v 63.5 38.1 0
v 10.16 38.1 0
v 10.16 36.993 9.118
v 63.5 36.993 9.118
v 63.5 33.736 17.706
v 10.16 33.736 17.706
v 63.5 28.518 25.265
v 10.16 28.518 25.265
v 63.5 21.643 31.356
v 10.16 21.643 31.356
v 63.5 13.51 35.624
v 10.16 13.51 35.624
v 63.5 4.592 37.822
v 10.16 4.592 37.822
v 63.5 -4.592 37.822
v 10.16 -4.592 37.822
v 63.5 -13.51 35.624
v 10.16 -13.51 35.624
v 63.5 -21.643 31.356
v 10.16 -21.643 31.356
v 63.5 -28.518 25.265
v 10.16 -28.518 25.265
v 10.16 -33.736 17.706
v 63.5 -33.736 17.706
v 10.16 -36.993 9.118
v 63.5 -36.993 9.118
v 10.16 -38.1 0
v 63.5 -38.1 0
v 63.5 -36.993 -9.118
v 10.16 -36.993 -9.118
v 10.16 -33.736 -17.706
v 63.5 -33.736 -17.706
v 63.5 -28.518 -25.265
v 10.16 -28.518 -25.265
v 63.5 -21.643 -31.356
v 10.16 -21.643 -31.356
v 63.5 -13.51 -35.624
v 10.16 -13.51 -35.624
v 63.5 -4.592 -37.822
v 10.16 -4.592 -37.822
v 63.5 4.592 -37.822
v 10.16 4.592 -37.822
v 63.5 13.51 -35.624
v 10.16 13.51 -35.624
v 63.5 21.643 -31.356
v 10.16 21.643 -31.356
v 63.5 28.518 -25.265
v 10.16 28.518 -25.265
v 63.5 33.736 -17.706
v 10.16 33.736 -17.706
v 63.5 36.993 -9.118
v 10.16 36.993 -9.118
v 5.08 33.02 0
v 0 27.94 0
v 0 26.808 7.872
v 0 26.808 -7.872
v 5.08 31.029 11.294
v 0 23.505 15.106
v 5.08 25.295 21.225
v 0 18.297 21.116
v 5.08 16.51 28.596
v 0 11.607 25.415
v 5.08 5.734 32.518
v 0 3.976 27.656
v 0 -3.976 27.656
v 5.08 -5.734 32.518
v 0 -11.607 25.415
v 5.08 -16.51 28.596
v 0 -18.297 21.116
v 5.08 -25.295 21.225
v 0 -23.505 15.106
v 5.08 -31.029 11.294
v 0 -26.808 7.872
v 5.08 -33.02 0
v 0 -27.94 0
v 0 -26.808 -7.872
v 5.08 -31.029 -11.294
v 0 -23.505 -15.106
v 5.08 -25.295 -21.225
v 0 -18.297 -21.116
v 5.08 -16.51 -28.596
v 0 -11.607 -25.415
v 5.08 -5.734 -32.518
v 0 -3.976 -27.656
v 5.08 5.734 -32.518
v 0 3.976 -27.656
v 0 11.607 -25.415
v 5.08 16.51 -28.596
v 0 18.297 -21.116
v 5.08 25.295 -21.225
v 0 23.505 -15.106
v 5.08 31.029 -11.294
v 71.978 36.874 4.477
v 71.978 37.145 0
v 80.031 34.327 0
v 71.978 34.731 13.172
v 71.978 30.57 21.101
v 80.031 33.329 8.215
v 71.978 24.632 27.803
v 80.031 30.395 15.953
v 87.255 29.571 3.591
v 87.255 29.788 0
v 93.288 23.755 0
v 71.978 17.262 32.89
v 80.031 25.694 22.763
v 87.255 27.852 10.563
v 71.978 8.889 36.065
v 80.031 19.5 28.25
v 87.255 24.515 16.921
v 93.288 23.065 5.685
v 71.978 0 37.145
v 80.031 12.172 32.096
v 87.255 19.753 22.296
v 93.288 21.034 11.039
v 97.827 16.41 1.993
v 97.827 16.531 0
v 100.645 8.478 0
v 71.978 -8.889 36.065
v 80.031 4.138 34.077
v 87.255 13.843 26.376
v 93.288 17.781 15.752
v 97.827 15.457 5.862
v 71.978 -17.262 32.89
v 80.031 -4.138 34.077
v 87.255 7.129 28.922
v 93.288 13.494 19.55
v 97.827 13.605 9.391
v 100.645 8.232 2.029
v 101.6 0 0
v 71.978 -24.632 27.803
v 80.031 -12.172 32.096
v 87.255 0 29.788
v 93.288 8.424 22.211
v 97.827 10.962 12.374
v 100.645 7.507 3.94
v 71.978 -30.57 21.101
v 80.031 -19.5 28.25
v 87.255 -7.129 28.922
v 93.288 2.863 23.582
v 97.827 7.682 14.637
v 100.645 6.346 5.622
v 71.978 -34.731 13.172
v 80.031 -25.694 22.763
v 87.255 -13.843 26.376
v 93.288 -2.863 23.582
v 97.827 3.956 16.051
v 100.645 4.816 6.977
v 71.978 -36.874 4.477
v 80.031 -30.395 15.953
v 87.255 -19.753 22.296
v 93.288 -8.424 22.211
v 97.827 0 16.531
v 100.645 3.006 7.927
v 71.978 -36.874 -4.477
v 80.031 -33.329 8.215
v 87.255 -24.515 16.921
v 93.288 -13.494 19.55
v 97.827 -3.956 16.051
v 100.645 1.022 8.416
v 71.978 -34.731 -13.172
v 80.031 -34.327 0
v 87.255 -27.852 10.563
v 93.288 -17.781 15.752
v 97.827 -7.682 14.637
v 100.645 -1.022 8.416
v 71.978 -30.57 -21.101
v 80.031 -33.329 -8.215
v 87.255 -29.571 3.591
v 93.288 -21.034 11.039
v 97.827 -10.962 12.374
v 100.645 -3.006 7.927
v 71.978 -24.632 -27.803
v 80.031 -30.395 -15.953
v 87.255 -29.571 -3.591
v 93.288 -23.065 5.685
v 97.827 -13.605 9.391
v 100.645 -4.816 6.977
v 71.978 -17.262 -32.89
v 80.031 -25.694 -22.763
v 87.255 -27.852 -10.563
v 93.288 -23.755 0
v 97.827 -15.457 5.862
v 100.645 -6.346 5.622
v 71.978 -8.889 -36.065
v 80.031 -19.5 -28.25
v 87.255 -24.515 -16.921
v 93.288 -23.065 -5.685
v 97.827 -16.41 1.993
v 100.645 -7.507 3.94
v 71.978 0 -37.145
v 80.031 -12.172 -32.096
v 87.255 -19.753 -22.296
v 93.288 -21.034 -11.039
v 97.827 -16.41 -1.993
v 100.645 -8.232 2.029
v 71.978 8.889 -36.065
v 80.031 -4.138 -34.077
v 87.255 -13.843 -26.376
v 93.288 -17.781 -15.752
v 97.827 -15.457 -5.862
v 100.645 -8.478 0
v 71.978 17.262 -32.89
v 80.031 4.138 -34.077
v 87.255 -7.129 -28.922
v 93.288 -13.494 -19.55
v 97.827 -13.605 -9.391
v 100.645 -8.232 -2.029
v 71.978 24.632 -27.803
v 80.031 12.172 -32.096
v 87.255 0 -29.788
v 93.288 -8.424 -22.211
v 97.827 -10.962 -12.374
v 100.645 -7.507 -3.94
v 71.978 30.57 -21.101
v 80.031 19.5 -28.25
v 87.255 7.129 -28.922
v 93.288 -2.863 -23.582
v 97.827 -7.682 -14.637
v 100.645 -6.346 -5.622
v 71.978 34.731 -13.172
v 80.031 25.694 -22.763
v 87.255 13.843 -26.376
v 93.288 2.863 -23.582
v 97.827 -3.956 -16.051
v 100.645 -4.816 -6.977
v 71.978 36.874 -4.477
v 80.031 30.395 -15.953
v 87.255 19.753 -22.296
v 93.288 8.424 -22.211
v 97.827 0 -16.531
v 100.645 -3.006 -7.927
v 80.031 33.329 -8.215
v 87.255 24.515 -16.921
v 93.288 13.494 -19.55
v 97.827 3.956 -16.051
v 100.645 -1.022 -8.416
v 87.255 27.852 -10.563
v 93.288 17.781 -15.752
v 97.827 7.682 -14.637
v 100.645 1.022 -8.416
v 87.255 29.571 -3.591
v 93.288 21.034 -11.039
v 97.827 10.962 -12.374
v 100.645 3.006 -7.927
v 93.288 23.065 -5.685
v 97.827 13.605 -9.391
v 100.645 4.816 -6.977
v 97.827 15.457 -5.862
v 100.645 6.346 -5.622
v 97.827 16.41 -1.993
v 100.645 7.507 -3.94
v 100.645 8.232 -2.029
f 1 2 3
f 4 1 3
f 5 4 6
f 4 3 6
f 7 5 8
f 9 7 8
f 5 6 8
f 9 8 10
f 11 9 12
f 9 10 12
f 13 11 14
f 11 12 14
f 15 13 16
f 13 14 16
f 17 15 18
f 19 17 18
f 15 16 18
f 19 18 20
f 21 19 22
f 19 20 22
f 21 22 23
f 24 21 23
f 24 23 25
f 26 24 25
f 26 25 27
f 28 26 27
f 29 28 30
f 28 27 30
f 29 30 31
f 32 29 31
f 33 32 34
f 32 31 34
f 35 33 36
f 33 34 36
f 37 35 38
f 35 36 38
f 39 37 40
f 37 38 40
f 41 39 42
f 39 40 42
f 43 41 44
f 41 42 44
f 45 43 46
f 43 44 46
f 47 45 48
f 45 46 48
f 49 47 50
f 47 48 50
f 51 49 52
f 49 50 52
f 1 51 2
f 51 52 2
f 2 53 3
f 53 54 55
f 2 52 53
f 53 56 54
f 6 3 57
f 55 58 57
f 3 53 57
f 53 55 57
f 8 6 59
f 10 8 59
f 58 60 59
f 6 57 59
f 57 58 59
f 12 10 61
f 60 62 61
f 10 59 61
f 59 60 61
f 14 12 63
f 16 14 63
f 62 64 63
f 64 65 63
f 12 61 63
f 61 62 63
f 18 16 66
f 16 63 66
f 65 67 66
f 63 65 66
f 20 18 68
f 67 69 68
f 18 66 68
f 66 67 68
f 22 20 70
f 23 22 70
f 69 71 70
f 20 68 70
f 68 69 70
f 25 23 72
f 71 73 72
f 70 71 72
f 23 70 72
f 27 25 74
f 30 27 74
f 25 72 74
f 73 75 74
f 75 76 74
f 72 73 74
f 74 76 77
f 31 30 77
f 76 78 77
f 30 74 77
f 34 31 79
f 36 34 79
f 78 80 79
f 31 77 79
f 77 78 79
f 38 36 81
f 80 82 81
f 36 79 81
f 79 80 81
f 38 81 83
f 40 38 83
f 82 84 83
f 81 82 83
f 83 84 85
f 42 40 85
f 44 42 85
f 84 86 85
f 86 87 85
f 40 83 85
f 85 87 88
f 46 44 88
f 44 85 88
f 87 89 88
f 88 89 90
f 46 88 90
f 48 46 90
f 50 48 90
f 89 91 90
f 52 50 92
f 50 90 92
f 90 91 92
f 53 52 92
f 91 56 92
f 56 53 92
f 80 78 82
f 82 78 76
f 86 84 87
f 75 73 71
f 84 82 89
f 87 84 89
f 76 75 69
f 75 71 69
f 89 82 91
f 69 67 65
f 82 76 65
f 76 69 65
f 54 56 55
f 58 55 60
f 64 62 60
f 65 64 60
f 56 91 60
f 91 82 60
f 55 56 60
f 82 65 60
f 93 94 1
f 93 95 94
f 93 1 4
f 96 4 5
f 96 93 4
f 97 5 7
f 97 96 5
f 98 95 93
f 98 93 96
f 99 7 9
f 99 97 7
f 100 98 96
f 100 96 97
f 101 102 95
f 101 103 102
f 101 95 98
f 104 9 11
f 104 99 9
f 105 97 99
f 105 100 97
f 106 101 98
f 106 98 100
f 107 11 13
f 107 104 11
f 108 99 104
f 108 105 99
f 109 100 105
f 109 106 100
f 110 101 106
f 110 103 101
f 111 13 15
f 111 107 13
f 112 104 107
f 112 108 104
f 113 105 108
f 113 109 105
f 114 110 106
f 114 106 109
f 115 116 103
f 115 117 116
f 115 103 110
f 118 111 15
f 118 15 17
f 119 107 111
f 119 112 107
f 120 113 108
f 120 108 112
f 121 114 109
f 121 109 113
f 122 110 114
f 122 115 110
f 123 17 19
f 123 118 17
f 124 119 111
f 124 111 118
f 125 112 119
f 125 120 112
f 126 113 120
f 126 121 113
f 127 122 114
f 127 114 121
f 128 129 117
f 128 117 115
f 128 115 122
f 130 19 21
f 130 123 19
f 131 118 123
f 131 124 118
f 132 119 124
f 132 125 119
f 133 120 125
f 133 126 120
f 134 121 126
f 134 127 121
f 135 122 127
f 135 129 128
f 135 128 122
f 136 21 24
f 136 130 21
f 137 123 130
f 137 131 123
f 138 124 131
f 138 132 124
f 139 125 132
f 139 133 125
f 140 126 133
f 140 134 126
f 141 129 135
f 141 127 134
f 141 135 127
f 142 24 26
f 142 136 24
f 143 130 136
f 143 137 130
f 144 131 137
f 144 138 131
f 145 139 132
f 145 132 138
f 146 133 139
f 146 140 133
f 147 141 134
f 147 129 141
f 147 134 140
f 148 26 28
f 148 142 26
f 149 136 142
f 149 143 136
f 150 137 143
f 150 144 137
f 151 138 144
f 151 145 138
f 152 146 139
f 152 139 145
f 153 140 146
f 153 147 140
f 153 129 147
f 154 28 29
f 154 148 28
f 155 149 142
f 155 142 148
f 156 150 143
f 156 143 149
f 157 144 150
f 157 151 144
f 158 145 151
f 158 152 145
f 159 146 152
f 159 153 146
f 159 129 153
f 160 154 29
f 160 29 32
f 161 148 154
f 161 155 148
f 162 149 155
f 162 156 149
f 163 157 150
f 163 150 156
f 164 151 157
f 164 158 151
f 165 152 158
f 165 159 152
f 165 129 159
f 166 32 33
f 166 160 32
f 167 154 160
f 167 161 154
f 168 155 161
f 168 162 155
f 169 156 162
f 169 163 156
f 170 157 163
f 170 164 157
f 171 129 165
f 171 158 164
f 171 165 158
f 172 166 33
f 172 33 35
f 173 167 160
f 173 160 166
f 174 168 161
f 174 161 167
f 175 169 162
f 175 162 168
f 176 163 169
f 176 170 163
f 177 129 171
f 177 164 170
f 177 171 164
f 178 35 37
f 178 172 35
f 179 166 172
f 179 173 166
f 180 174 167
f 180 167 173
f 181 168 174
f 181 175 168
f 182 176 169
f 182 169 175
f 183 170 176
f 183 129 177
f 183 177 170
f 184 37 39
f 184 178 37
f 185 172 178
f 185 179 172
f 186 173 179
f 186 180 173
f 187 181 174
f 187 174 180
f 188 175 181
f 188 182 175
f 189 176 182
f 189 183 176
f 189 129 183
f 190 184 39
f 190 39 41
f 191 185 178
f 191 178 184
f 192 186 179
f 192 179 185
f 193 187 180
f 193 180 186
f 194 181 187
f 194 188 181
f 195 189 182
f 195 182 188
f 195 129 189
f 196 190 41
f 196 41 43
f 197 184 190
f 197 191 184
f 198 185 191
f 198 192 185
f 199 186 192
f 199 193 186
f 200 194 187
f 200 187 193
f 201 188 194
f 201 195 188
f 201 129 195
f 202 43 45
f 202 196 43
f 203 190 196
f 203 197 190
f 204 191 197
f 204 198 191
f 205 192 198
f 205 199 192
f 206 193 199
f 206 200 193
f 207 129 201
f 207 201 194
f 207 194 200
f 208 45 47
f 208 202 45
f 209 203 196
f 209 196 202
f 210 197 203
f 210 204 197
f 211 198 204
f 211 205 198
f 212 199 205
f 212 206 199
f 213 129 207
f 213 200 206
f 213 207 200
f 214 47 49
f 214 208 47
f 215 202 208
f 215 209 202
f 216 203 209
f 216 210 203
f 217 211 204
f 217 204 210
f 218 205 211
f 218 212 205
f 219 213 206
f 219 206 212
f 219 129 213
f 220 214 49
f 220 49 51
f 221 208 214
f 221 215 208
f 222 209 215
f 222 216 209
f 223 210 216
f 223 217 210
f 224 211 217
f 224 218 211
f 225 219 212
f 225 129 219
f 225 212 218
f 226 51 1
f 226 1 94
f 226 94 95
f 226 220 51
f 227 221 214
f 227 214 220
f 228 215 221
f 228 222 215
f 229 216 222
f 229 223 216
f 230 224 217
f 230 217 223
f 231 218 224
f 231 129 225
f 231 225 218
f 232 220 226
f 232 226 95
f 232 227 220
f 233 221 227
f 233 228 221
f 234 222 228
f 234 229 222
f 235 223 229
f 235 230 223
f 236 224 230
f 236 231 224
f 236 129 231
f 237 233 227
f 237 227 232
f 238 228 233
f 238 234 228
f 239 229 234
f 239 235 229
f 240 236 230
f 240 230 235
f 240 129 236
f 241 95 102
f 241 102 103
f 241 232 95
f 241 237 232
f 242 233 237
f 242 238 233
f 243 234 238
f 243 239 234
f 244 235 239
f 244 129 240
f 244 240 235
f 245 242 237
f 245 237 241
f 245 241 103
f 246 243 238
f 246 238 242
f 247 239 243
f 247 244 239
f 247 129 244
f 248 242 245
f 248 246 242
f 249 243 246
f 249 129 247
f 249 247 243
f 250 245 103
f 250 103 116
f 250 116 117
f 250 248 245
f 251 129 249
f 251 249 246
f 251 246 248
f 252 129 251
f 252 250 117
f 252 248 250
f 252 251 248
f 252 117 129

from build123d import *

# Parameters (mm, degrees)
F0_R     = 38.1
F1_DEPTH = 101.6
F2_R     = 38.1
F3_SIZE  = 10.16


with BuildPart() as f1:
    # F0 (on Right) → F1 (new body)
    with BuildSketch(Plane.YZ):
        Circle(F0_R)
    extrude(amount=F1_DEPTH)

    # F2
    f2_edges = [f1.edges().sort_by_distance(p)[0] for p in [
        (101.6, -38.1, 0),
    ]]
    fillet(f2_edges, radius=F2_R)

    # F3
    f3_edges = [f1.edges().sort_by_distance(p)[0] for p in [
        (0, -38.1, 0),
    ]]
    chamfer(f3_edges, length=F3_SIZE)


solid = f1.part
